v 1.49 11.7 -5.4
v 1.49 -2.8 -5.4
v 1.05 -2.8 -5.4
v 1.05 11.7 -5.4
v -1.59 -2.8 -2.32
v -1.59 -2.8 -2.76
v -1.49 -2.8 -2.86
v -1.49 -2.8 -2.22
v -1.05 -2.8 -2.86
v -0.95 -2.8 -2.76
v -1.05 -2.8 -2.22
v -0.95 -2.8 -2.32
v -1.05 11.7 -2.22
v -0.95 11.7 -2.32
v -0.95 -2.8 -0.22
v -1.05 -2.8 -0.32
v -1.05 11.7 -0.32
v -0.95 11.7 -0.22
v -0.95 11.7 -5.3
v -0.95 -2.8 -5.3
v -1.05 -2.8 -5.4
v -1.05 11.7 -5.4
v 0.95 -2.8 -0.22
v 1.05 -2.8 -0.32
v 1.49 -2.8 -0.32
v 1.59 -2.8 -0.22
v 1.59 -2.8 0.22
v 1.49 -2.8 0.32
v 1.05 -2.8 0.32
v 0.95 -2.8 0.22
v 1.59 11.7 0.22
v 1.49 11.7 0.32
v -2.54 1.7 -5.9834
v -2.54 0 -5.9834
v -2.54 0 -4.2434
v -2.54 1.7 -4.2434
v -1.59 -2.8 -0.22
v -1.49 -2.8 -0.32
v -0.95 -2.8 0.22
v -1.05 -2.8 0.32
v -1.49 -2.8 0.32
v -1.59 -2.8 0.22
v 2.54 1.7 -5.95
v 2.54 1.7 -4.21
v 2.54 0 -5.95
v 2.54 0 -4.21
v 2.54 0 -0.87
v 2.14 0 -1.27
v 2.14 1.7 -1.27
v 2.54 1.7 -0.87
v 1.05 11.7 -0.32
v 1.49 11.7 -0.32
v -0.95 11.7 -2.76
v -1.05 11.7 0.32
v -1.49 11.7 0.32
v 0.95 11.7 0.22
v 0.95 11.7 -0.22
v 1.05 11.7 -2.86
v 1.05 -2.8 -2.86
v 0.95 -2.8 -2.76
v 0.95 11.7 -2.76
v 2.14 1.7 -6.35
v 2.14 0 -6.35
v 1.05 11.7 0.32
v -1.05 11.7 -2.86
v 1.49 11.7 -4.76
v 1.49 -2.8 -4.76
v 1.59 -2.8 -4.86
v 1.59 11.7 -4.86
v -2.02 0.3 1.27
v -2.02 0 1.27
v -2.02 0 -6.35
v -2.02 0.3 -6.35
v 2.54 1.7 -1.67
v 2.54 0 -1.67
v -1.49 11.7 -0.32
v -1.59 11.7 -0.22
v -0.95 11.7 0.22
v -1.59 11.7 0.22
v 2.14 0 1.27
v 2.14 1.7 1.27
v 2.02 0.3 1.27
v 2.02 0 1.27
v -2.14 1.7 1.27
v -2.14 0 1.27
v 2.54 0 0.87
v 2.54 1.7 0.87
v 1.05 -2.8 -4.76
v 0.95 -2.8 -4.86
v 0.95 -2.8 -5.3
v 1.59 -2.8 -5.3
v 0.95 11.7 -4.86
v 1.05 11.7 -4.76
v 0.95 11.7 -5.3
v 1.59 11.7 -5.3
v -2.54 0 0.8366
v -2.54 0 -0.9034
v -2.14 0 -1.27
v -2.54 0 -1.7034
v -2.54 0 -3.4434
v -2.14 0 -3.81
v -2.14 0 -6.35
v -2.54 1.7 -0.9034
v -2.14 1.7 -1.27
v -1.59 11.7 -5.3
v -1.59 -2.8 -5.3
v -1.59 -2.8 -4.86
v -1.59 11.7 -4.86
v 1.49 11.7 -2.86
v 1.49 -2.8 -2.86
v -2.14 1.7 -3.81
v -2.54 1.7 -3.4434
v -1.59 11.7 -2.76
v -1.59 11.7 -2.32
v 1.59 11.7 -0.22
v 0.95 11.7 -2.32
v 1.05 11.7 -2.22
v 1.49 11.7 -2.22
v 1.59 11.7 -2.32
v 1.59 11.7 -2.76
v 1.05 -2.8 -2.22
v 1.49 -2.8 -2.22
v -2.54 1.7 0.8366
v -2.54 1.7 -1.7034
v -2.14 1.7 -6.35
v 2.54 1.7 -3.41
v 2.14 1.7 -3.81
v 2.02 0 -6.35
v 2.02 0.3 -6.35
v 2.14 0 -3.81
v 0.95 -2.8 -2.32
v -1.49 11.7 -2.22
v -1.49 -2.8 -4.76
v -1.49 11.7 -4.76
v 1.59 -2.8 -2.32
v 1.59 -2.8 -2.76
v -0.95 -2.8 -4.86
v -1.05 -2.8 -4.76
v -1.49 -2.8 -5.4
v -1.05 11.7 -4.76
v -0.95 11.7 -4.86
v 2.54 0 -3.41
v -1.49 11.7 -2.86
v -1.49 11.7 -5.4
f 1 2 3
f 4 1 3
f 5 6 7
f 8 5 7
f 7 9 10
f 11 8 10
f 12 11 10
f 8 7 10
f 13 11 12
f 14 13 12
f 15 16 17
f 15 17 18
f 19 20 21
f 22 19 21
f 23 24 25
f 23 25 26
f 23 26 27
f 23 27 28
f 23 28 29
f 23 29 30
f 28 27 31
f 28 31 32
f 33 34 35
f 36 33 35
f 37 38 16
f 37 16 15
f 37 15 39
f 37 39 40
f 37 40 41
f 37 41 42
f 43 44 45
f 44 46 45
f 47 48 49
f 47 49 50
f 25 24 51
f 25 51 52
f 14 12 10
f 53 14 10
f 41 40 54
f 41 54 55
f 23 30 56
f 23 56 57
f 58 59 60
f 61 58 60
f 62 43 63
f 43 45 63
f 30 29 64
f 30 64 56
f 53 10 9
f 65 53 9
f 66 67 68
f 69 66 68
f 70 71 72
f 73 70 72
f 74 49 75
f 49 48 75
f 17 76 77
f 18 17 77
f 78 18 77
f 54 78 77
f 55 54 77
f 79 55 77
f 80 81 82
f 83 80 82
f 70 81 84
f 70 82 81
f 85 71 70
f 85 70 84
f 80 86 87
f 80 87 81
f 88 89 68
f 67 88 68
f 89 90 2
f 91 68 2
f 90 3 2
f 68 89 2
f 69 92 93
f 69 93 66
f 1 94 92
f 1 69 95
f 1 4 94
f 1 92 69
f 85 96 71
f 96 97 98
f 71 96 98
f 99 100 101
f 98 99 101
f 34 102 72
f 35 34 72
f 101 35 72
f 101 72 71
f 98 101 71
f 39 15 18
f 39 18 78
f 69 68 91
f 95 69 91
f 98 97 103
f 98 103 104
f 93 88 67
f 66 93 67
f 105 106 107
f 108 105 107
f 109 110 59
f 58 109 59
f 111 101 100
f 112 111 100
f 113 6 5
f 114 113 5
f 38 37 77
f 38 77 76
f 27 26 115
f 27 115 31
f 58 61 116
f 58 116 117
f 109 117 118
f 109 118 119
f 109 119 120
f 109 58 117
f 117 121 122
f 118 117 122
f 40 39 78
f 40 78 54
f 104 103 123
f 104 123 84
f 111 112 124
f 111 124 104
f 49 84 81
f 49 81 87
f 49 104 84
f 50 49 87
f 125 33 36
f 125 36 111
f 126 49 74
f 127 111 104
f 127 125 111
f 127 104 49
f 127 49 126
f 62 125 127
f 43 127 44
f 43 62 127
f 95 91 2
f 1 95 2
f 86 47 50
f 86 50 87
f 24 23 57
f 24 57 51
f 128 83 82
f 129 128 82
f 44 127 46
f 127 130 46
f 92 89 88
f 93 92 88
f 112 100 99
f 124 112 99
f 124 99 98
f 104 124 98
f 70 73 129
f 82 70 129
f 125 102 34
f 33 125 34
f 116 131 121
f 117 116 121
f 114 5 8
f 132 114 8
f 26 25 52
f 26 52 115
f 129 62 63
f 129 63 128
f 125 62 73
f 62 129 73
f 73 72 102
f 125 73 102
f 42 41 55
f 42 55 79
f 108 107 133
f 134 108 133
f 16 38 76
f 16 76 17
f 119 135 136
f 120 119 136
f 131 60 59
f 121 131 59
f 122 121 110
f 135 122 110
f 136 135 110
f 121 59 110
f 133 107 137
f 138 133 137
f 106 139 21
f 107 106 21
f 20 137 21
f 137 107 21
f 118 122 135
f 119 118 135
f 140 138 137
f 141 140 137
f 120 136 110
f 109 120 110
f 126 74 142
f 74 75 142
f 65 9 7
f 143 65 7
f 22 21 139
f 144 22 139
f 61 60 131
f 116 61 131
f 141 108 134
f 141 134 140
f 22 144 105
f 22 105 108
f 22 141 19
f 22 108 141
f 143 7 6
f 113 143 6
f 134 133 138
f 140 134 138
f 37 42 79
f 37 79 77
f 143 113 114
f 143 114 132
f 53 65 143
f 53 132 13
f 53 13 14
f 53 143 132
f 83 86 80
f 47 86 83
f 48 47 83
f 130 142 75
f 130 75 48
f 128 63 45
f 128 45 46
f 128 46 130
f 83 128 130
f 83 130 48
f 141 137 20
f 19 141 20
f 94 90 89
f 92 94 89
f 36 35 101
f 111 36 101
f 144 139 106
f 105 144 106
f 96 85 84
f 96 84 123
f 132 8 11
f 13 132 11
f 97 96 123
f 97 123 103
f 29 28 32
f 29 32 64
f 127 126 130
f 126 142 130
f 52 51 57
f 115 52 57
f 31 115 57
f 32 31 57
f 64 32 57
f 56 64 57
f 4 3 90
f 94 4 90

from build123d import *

# Parameters (mm, degrees)
BOSS_EXTRUDE1_DEPTH   = 1.7
SKETCH2_W             = 4.04
SKETCH2_H             = 0.3
CUT_EXTRUDE1_DEPTH    = 2.54
BOSS_EXTRUDE2_START   = -4.5
BOSS_EXTRUDE2_DEPTH   = 14.5
BOSS_EXTRUDE2_2_DEPTH = 14.5
LPATTERN3_START       = -2.8
LPATTERN3_DEPTH       = 14.5
LPATTERN3_2_DEPTH     = 14.5
LPATTERN3_3_DEPTH     = 14.5
LPATTERN3_4_DEPTH     = 14.5
LPATTERN3_START_2     = 0.3
LPATTERN3_5_DEPTH     = 1.4
LPATTERN3_6_DEPTH     = 0.3


# Read off the part's stored shape, not the designer's step: LPattern3
with BuildPart() as part:
    # Sketch1 → Boss-Extrude1 (new body)
    with BuildSketch(Plane(origin=(0, 0, 0), x_dir=(1, 0, 0), z_dir=(0, 1, 0))):
        Polygon((-2.54, 0.903421053), (-2.14, 1.27), (2.14, 1.27), (2.54, 0.87), (2.54, -0.87), (2.14, -1.27), (-2.14, -1.27), (-2.54, -0.836578947), align=None)
    extrude(amount=BOSS_EXTRUDE1_DEPTH)

    # Sketch2 → Cut-Extrude1 (cut)
    with BuildSketch(Plane.XY.offset(1.27)):
        with Locations((0, 0.15)):
            Rectangle(SKETCH2_W, SKETCH2_H)
    extrude(amount=-CUT_EXTRUDE1_DEPTH, mode=Mode.SUBTRACT)

    # LPattern3 5 outline → LPattern3 5 (add)
    with BuildSketch(Plane(origin=(0, 0, 0), x_dir=(1, 0, 0), z_dir=(0, 1, 0)).offset(LPATTERN3_START_2)):
        Polygon((-2.54, 3.443421053), (-2.54, 1.703421053), (-2.14, 1.27), (2.14, 1.27), (2.54, 1.67), (2.54, 3.41), (2.14, 3.81), (2.54, 4.21), (2.54, 5.95), (2.14, 6.35), (-2.14, 6.35), (-2.54, 5.983421053), (-2.54, 4.243421053), (-2.14, 3.81), align=None)
    extrude(amount=LPATTERN3_5_DEPTH)

    # LPattern3 6 outline → LPattern3 6 (add)
    with BuildSketch(Plane(origin=(0, 0, 0), x_dir=(1, 0, 0), z_dir=(0, 1, 0))):
        Polygon((-2.54, 3.443421053), (-2.54, 1.703421053), (-2.14, 1.27), (-2.02, 1.27), (-2.02, 6.35), (-2.14, 6.35), (-2.54, 5.983421053), (-2.54, 4.243421053), (-2.14, 3.81), align=None)
        Polygon((2.02, 6.35), (2.02, 1.27), (2.14, 1.27), (2.54, 1.67), (2.54, 3.41), (2.14, 3.81), (2.54, 4.21), (2.54, 5.95), (2.14, 6.35), align=None)
    extrude(amount=LPATTERN3_6_DEPTH)


with BuildPart() as body_2:
    # Sketch3 → Boss-Extrude2 (new body)
    with BuildSketch(Plane(origin=(0, 1.7, 0), x_dir=(1, 0, 0), z_dir=(0, 1, 0)).offset(BOSS_EXTRUDE2_START)):
        Polygon((-1.49, 0.32), (-1.05, 0.32), (-0.95, 0.22), (-0.95, -0.22), (-1.05, -0.32), (-1.49, -0.32), (-1.59, -0.22), (-1.59, 0.22), align=None)
    extrude(amount=BOSS_EXTRUDE2_DEPTH)


with BuildPart() as body_3:
    # Sketch3 → Boss-Extrude2 2 (new body)
    with BuildSketch(Plane(origin=(0, 1.7, 0), x_dir=(1, 0, 0), z_dir=(0, 1, 0)).offset(BOSS_EXTRUDE2_START)):
        Polygon((1.05, 0.32), (1.49, 0.32), (1.59, 0.22), (1.59, -0.22), (1.49, -0.32), (1.05, -0.32), (0.95, -0.22), (0.95, 0.22), align=None)
    extrude(amount=BOSS_EXTRUDE2_2_DEPTH)


with BuildPart() as body_4:
    # LPattern3 outline → LPattern3 (new body)
    with BuildSketch(Plane(origin=(0, 0, 0), x_dir=(1, 0, 0), z_dir=(0, 1, 0)).offset(LPATTERN3_START)):
        Polygon((0.95, 5.3), (0.95, 4.86), (1.05, 4.76), (1.49, 4.76), (1.59, 4.86), (1.59, 5.3), (1.49, 5.4), (1.05, 5.4), align=None)
    extrude(amount=LPATTERN3_DEPTH)


with BuildPart() as body_5:
    # LPattern3 2 outline → LPattern3 2 (new body)
    with BuildSketch(Plane(origin=(0, 0, 0), x_dir=(1, 0, 0), z_dir=(0, 1, 0)).offset(LPATTERN3_START)):
        Polygon((-1.05, 5.4), (-1.49, 5.4), (-1.59, 5.3), (-1.59, 4.86), (-1.49, 4.76), (-1.05, 4.76), (-0.95, 4.86), (-0.95, 5.3), align=None)
    extrude(amount=LPATTERN3_2_DEPTH)


with BuildPart() as body_6:
    # LPattern3 3 outline → LPattern3 3 (new body)
    with BuildSketch(Plane(origin=(0, 0, 0), x_dir=(1, 0, 0), z_dir=(0, 1, 0)).offset(LPATTERN3_START)):
        Polygon((0.95, 2.76), (0.95, 2.32), (1.05, 2.22), (1.49, 2.22), (1.59, 2.32), (1.59, 2.76), (1.49, 2.86), (1.05, 2.86), align=None)
    extrude(amount=LPATTERN3_3_DEPTH)


with BuildPart() as body_7:
    # LPattern3 4 outline → LPattern3 4 (new body)
    with BuildSketch(Plane(origin=(0, 0, 0), x_dir=(1, 0, 0), z_dir=(0, 1, 0)).offset(LPATTERN3_START)):
        Polygon((-1.05, 2.86), (-1.49, 2.86), (-1.59, 2.76), (-1.59, 2.32), (-1.49, 2.22), (-1.05, 2.22), (-0.95, 2.32), (-0.95, 2.76), align=None)
    extrude(amount=LPATTERN3_4_DEPTH)


solid = Compound([part.part, body_2.part, body_3.part, body_4.part, body_5.part, body_6.part, body_7.part])
